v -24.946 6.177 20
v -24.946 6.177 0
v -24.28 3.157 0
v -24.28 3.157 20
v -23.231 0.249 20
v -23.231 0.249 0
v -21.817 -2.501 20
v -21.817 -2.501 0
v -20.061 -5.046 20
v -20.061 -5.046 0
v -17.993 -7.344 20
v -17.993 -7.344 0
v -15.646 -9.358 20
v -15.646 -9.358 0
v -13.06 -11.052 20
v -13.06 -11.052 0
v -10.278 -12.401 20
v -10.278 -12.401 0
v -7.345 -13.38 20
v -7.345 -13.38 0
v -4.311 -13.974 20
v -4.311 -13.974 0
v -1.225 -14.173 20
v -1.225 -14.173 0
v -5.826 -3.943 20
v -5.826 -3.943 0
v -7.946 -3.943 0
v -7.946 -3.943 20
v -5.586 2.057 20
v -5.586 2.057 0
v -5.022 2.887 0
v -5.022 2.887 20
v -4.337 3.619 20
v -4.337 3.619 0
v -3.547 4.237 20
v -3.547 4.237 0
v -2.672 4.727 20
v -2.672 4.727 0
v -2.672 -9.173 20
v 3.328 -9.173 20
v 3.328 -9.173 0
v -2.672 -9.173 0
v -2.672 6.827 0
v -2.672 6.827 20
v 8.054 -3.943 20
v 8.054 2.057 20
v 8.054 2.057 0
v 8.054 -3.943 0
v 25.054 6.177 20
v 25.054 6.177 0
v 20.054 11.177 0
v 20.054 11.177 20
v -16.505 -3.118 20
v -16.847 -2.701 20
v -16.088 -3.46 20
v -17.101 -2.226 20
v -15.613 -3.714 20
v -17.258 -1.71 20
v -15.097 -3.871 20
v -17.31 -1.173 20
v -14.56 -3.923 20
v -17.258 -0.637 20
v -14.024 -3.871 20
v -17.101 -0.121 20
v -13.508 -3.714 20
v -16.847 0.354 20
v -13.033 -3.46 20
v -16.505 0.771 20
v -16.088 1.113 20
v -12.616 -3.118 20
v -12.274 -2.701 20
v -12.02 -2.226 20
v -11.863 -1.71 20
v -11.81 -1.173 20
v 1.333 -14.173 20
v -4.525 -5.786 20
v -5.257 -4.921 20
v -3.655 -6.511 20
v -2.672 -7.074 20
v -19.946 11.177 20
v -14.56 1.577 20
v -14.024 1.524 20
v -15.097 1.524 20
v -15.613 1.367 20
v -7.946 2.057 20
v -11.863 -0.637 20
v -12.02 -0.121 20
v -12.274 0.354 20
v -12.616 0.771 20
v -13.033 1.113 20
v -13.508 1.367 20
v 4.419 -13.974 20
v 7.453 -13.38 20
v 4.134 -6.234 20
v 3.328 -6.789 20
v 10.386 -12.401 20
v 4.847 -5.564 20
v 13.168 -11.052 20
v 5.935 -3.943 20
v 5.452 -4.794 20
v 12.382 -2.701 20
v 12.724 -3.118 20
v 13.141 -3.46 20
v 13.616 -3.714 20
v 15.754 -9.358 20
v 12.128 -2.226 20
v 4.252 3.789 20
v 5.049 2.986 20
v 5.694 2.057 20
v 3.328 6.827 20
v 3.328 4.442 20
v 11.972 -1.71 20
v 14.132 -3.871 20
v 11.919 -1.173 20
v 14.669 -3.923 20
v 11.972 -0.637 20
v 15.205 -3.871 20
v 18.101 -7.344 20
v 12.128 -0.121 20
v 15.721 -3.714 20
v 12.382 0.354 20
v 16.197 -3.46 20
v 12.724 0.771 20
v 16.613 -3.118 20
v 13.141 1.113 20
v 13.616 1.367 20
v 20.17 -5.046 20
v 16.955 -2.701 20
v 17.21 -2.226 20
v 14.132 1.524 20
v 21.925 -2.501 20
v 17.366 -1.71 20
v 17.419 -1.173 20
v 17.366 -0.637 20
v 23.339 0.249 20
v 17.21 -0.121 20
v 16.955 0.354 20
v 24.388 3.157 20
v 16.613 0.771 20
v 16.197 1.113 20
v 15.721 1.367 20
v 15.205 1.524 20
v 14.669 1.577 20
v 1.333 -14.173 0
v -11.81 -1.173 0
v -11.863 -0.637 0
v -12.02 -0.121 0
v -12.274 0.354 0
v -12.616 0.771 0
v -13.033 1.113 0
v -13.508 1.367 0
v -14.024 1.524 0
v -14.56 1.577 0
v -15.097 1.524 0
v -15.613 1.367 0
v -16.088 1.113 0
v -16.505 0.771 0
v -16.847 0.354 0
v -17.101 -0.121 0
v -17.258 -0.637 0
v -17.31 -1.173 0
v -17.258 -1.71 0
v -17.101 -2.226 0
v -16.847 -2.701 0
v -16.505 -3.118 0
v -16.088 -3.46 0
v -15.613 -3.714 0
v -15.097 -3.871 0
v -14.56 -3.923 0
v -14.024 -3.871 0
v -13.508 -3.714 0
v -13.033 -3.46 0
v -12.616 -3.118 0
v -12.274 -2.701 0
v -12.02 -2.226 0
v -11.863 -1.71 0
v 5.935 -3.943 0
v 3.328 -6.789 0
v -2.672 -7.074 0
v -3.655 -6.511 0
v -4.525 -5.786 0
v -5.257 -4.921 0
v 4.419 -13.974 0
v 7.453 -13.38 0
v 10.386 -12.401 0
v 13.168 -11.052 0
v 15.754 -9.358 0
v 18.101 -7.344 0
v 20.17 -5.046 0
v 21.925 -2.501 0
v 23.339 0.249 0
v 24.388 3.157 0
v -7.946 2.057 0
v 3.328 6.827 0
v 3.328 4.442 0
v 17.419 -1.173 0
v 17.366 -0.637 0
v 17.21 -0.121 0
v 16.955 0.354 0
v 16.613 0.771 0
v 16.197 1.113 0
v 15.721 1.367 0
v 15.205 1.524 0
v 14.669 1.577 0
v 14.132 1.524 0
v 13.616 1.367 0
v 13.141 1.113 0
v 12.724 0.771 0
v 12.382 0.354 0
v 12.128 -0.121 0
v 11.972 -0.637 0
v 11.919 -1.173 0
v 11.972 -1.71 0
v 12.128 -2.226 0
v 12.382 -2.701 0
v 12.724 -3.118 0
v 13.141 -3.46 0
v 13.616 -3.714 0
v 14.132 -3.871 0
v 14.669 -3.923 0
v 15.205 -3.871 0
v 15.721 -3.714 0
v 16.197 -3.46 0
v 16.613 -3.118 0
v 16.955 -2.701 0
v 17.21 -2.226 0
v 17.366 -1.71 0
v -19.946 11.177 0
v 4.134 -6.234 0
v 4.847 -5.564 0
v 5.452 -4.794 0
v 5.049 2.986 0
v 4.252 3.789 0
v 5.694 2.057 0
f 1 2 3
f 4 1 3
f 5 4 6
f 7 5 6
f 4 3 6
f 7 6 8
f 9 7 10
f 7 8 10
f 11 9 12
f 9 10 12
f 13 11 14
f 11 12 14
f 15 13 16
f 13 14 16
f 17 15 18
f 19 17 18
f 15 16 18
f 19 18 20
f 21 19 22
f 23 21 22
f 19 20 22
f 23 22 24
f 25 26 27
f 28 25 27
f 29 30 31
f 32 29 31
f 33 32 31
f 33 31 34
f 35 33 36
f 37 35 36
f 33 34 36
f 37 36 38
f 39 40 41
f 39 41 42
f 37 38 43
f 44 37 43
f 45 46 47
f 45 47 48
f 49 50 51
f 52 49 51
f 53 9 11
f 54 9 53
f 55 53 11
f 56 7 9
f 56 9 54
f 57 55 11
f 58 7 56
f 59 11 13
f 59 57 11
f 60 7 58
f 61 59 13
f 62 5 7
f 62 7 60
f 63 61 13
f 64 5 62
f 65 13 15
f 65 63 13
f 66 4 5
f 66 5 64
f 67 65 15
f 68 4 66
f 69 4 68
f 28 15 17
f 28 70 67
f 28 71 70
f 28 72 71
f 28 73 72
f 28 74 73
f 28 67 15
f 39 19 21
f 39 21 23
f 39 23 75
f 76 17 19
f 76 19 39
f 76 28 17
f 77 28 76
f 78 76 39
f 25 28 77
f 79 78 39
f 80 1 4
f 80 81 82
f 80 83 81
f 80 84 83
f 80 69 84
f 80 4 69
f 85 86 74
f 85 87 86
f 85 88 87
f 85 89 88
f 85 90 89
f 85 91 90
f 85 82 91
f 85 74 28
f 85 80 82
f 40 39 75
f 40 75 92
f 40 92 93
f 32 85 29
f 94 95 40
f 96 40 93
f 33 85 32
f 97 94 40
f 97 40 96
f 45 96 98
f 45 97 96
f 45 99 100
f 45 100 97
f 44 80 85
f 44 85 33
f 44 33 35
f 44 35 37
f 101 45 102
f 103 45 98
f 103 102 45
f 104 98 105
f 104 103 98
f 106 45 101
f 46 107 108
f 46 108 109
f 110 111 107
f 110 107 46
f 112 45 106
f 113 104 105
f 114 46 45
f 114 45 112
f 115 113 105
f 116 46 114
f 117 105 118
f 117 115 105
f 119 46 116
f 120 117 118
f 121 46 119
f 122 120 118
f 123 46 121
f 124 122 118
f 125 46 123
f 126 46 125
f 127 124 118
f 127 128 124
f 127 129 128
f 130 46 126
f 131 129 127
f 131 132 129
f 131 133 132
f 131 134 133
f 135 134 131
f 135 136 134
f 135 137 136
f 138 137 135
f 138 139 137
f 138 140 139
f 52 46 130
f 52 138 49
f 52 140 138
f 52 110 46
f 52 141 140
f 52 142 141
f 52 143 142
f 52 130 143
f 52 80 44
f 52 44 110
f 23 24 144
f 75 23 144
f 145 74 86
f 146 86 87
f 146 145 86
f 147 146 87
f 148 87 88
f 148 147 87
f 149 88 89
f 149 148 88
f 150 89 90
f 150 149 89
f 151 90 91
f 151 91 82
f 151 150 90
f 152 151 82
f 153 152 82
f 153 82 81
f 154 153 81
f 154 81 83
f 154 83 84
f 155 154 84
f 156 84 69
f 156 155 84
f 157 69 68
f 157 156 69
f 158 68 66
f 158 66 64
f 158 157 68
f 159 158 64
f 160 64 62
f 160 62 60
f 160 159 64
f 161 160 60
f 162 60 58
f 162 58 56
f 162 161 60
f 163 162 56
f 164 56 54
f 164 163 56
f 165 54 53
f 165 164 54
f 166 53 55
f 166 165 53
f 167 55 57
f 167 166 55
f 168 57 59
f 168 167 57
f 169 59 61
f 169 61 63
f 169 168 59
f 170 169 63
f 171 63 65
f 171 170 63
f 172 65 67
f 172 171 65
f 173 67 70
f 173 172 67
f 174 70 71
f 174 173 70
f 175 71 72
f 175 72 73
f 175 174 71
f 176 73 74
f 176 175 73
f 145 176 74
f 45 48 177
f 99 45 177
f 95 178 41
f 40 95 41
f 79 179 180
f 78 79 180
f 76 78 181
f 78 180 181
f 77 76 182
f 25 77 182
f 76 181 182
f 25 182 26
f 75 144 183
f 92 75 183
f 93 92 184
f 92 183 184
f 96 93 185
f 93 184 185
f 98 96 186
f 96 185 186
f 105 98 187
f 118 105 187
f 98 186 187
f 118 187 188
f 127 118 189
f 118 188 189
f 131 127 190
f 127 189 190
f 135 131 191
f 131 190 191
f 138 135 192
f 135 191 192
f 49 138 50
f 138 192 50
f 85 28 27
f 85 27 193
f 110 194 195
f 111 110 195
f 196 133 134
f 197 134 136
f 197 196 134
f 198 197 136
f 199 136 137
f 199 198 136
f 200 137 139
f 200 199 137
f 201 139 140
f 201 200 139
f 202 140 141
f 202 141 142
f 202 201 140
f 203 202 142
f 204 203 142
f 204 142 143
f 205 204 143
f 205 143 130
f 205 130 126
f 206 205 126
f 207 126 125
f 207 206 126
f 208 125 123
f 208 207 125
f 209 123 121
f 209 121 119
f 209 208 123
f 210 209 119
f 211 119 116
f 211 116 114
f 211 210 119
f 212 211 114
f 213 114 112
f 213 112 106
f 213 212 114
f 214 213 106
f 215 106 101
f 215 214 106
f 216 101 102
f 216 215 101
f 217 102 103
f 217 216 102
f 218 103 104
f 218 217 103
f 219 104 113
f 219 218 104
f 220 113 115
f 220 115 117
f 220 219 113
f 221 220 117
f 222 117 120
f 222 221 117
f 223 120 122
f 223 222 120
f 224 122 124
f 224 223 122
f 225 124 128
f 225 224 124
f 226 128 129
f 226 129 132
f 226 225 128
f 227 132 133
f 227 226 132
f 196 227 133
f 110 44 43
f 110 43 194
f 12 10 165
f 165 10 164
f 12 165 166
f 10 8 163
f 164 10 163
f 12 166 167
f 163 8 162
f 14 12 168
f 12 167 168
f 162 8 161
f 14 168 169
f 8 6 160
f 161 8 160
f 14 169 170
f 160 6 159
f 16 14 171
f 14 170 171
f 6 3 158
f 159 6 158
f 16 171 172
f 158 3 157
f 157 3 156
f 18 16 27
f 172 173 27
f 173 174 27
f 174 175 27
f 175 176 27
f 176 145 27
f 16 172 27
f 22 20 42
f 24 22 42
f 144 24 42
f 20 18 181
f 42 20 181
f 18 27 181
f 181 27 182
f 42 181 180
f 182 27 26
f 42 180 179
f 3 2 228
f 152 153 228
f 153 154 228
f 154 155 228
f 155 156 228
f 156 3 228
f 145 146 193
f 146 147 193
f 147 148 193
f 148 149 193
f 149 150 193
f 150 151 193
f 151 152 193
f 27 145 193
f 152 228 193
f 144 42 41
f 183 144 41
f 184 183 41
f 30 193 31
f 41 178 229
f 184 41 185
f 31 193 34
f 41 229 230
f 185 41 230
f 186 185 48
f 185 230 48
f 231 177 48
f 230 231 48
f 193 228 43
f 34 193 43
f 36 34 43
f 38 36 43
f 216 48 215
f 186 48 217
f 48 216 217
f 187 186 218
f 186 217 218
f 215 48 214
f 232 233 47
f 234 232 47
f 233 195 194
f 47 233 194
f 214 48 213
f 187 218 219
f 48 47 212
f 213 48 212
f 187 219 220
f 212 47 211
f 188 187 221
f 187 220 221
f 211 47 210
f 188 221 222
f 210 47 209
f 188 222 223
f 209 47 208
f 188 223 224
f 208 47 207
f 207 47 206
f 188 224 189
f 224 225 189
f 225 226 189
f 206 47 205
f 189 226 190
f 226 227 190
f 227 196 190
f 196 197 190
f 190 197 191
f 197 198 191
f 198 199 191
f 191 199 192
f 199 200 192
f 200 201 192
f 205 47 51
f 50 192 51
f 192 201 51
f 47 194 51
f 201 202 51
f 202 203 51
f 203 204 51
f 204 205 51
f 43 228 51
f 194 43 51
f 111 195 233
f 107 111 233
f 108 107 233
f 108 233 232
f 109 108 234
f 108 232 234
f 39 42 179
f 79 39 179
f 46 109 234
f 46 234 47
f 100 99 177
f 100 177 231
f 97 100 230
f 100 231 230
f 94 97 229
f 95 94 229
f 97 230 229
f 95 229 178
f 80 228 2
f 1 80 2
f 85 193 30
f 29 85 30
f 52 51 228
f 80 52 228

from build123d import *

# Parameters (mm, degrees)
F0_R     = 2.75
F1_DEPTH = 20


with BuildPart() as f1:
    # F0 (on Top) → F1 (new body)
    with BuildSketch(Plane.XY):
        with BuildLine():
            Line((25.054192, 6.176512), (20.054192, 11.176512))
            Line((20.054192, 11.176512), (-19.945808, 11.176512))
            Line((-19.945808, 11.176512), (-24.945808, 6.176512))
            ThreePointArc((-24.945808, 6.176512), (-16.851883, -8.388866), (-1.224984, -14.173488))
            Line((-1.224984, -14.173488), (1.333368, -14.173488))
            ThreePointArc((1.333368, -14.173488), (16.960268, -8.388866), (25.054192, 6.176512))
        make_face()
        with Locations((-14.560476, -1.173488)):
            Circle(F0_R, mode=Mode.SUBTRACT)
        with BuildLine():
            Line((5.694343, 2.05741), (8.054192, 2.05741))
            Line((8.054192, 2.05741), (8.054192, -3.94259))
            Line((8.054192, -3.94259), (5.934845, -3.94259))
            ThreePointArc((5.934845, -3.94259), (4.847493, -5.563735), (3.327843, -6.788932))
            Line((3.327843, -6.788932), (3.327843, -9.173488))
            Line((3.327843, -9.173488), (-2.672157, -9.173488))
            Line((-2.672157, -9.173488), (-2.672157, -7.074083))
            ThreePointArc((-2.672157, -7.074083), (-4.525293, -5.786331), (-5.82646, -3.94259))
            Line((-5.82646, -3.94259), (-7.945808, -3.94259))
            Line((-7.945808, -3.94259), (-7.945808, 2.05741))
            Line((-7.945808, 2.05741), (-5.585958, 2.05741))
            ThreePointArc((-5.585958, 2.05741), (-4.336867, 3.619069), (-2.672157, 4.727107))
            Line((-2.672157, 4.727107), (-2.672157, 6.826512))
            Line((-2.672157, 6.826512), (3.327843, 6.826512))
            Line((3.327843, 6.826512), (3.327843, 4.441956))
            ThreePointArc((3.327843, 4.441956), (4.667811, 3.405215), (5.694343, 2.05741))
        make_face(mode=Mode.SUBTRACT)
        with Locations((14.668861, -1.173488)):
            Circle(F0_R, mode=Mode.SUBTRACT)
    extrude(amount=F1_DEPTH)


solid = f1.part
